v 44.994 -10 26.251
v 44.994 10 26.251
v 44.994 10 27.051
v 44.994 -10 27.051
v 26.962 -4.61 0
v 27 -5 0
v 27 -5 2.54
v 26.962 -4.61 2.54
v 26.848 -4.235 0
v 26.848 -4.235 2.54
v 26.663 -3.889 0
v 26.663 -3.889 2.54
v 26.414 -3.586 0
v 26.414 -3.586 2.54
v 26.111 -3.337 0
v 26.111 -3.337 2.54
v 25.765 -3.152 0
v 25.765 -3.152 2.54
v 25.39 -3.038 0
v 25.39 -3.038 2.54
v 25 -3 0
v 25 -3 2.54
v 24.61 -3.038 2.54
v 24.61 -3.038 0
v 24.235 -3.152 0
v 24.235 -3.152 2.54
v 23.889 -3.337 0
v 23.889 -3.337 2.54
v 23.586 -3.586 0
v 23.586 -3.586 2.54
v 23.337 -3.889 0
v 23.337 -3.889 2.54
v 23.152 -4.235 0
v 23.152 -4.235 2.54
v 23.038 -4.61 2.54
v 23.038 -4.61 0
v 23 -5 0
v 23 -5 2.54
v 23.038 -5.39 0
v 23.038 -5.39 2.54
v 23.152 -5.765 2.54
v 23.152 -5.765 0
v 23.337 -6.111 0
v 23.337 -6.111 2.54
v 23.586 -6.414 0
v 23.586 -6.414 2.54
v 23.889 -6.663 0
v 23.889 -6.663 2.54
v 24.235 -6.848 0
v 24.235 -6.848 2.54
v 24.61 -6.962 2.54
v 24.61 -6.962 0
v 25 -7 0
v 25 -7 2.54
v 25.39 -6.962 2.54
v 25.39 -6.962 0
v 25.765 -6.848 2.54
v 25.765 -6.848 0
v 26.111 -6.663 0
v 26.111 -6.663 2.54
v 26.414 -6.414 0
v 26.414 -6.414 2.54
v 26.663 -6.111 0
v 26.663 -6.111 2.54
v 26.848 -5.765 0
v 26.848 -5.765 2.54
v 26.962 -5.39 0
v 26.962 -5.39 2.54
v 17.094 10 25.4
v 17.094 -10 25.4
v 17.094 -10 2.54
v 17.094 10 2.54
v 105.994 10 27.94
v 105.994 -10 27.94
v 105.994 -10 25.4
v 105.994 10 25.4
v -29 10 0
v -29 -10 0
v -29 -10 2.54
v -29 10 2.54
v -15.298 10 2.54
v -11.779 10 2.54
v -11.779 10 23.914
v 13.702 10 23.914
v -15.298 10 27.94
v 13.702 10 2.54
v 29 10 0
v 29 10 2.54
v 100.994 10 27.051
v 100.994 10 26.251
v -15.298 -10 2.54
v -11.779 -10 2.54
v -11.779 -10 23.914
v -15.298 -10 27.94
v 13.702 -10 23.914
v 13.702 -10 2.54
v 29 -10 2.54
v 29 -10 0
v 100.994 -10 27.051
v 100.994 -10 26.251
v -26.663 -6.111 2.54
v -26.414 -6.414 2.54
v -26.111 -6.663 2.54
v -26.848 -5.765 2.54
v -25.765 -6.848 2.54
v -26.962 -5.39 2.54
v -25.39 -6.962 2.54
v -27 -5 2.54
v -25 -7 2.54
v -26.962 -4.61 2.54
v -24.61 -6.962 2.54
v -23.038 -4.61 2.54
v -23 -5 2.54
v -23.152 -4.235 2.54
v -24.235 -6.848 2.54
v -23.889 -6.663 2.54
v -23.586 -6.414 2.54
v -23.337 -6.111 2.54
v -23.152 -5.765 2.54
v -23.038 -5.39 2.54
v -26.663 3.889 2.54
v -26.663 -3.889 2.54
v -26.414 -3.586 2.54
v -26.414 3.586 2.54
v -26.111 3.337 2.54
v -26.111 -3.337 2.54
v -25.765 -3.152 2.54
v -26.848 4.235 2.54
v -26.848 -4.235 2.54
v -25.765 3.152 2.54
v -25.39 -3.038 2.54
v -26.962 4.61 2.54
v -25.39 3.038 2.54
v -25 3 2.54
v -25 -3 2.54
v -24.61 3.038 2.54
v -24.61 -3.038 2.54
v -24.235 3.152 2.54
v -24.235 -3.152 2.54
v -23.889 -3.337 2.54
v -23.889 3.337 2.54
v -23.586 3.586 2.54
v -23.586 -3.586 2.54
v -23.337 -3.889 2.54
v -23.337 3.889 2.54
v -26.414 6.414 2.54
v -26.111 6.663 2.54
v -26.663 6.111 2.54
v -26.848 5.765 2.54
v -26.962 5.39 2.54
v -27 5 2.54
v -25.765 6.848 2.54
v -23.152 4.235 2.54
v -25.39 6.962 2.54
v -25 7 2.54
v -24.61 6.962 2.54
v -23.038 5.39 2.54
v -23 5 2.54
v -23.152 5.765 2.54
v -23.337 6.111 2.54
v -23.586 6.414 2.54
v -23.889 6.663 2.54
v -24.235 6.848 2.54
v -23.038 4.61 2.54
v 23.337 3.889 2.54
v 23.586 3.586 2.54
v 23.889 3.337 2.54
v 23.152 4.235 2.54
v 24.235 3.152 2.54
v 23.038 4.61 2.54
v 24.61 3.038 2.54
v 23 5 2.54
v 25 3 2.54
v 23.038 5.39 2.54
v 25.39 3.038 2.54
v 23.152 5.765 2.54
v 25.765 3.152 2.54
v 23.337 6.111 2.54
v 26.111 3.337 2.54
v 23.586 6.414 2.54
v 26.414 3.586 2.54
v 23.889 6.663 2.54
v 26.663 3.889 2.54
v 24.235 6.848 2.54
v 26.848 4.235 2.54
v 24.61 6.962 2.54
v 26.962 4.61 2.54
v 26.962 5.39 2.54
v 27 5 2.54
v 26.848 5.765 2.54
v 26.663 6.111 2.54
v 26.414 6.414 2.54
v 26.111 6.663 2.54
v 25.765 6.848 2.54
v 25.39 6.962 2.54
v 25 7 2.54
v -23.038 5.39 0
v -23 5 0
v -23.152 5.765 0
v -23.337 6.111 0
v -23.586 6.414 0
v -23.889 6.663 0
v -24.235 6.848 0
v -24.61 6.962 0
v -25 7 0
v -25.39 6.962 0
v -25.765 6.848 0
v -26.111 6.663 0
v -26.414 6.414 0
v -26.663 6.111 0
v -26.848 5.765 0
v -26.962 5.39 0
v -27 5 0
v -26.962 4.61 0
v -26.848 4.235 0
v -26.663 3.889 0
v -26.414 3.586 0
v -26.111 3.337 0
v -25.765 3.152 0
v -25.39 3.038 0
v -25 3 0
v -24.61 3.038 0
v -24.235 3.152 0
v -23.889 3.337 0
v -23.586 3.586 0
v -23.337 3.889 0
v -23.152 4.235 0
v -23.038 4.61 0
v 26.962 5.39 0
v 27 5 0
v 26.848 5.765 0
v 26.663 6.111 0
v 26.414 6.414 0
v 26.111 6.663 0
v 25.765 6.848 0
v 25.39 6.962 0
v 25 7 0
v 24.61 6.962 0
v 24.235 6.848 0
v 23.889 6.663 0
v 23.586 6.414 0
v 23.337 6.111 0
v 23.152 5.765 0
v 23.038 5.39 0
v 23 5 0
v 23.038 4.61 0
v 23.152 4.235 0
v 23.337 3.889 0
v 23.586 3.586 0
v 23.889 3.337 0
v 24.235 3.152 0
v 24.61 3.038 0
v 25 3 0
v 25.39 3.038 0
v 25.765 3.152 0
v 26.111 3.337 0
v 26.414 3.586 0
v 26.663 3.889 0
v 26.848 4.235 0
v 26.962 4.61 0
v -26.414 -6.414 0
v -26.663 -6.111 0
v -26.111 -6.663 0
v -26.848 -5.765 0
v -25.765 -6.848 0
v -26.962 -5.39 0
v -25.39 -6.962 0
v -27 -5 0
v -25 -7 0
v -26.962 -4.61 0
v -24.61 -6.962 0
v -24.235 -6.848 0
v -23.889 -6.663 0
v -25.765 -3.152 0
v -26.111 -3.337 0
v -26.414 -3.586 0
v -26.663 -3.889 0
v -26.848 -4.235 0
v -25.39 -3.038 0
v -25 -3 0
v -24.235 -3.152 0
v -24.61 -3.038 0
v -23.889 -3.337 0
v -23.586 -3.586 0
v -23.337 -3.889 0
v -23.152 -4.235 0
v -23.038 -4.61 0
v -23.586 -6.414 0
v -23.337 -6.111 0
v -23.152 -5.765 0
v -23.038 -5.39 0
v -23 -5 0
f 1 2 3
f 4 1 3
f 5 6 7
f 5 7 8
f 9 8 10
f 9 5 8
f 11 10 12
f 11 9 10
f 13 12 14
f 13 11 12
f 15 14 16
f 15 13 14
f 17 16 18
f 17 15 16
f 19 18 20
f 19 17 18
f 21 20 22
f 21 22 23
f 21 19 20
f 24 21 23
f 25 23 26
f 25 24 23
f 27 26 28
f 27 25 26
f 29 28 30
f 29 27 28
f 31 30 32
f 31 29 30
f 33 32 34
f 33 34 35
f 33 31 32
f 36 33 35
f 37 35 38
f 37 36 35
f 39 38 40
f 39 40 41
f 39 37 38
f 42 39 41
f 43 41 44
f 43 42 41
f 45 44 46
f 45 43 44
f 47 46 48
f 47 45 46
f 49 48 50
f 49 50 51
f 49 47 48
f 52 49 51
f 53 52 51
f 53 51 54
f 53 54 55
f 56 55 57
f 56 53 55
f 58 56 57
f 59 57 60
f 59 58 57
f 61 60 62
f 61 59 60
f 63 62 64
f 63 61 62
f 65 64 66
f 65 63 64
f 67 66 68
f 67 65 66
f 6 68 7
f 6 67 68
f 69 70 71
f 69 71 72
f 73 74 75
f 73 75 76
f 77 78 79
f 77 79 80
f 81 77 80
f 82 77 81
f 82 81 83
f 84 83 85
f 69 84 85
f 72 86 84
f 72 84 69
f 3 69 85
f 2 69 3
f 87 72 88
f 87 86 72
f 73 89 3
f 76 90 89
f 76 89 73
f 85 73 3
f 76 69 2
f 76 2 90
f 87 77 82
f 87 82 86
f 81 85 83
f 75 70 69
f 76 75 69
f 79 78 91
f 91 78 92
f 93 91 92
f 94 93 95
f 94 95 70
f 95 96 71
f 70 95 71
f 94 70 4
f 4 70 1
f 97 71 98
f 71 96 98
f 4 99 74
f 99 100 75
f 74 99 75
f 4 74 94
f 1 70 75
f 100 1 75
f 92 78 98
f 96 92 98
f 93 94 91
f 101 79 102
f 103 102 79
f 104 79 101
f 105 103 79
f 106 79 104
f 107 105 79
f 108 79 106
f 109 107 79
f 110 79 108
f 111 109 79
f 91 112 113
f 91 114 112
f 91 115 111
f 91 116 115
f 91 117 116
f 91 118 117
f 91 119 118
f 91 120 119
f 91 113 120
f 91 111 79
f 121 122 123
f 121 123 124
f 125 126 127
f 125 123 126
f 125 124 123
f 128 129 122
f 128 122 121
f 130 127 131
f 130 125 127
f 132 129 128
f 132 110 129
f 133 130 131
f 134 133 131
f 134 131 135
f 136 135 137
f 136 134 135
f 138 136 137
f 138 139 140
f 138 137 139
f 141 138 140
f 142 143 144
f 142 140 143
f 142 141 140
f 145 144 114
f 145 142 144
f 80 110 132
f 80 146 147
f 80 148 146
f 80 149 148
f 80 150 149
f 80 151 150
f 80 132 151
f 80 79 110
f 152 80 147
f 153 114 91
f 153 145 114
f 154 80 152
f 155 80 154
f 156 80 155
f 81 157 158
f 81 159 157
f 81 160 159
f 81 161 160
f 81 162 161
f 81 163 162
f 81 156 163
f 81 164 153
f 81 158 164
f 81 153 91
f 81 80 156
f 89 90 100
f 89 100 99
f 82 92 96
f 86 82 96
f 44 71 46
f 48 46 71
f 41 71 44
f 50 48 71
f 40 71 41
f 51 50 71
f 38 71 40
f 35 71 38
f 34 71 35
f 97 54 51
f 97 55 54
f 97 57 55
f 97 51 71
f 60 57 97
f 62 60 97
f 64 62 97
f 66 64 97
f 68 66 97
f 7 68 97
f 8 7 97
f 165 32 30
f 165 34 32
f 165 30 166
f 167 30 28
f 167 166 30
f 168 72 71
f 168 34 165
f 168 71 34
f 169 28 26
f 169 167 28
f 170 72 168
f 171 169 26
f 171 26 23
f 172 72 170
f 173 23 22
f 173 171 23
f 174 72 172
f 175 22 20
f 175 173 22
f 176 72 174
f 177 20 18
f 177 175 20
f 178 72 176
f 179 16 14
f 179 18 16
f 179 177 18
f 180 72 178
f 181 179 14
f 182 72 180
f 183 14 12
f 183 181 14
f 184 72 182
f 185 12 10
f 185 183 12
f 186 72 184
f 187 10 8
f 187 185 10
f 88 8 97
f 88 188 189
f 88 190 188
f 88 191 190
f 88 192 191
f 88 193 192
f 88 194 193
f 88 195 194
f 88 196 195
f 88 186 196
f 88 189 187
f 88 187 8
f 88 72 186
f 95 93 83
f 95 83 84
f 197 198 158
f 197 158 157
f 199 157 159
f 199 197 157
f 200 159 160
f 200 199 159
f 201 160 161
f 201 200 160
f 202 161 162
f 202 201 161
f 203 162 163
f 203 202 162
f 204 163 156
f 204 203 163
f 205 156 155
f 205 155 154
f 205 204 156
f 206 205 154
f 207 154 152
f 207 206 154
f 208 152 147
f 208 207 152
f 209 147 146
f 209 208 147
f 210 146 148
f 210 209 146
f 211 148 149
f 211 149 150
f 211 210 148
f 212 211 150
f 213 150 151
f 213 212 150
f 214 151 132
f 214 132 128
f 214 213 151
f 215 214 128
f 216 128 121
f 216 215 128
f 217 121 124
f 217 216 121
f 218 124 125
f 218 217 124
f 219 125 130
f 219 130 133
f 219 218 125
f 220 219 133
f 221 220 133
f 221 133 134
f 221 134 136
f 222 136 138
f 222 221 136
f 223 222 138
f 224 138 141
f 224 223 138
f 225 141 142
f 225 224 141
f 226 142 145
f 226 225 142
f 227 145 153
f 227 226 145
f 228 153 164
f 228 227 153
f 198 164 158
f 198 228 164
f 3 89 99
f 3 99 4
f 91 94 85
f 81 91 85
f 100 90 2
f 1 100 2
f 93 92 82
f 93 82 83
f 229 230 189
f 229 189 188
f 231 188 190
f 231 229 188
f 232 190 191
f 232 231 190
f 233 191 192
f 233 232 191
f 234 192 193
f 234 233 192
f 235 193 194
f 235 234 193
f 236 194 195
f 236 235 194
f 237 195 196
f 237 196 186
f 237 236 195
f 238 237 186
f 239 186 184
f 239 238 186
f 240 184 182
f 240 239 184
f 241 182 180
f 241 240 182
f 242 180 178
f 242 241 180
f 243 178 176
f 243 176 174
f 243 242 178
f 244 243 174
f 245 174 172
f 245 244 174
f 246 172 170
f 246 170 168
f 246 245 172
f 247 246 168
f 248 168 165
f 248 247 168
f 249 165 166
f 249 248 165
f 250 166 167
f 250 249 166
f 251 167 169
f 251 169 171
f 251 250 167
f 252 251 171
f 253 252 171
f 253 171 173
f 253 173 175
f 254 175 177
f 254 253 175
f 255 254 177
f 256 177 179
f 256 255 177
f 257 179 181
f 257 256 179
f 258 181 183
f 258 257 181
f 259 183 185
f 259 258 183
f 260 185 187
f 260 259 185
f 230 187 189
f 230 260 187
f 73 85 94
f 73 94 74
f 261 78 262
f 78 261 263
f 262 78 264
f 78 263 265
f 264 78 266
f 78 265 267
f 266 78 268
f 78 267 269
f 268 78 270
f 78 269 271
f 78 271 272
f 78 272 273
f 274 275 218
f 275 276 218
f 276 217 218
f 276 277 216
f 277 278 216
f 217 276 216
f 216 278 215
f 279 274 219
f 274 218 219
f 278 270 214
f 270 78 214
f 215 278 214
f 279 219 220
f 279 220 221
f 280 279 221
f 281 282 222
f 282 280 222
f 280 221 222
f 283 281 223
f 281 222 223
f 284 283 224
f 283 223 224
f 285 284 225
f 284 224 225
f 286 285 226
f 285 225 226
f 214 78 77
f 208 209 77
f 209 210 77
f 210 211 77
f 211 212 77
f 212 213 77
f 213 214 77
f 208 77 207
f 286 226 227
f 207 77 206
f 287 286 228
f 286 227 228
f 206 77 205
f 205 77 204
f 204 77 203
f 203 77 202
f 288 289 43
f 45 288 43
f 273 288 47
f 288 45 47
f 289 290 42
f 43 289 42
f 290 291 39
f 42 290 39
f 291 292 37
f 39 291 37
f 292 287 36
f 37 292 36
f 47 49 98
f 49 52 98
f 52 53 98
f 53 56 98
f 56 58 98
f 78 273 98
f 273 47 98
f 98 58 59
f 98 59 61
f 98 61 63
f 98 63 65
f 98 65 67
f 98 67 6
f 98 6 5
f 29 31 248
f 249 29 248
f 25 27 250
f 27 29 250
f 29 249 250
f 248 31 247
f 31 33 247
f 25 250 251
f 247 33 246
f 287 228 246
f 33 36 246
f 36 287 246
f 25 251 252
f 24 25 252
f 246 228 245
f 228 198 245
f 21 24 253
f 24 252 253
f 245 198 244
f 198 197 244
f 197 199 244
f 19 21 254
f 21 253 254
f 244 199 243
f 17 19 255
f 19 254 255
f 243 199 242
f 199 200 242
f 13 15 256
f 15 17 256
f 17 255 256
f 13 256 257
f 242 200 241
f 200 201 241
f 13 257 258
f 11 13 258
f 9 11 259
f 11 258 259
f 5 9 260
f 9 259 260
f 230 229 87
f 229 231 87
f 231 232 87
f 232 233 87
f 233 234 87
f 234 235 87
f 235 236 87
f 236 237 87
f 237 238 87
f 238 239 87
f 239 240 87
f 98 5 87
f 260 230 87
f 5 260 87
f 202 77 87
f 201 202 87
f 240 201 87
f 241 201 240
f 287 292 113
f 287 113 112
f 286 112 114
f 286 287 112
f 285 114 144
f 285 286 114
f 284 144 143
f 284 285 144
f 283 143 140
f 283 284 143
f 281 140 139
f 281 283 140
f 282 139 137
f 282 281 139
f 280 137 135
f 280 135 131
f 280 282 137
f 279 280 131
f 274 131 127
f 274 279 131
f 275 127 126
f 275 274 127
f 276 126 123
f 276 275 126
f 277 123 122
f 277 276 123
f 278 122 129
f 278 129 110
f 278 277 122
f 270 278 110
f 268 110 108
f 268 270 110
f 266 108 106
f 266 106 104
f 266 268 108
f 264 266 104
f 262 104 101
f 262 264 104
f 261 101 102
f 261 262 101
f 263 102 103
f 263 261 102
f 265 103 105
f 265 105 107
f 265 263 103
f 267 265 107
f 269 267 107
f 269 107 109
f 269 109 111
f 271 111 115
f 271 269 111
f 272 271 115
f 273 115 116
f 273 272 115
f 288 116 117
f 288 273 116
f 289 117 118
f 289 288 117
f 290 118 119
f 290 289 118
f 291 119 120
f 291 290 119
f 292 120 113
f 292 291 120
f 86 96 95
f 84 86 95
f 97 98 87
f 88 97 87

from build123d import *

# Parameters (mm, degrees)
F0_W     = 58
F0_H     = 20
F0_R     = 2
F1_DEPTH = 2.54
F2_W     = 32.392131
F2_H     = 20
F3_DEPTH = 25.4
F4_W     = 20
F4_H     = 2.54
F5_DEPTH = 88.9
F6_W     = 56
F6_H     = 0.8
F7_DEPTH = 20.001
F8_W     = 25.481197
F8_H     = 21.373894
F9_DEPTH = 20.001


with BuildPart() as f1:
    # F0 (on Top) → F1 (new body)
    with BuildSketch(Plane.XY):
        Rectangle(F0_W, F0_H)
        with Locations((-25, -5)):
            Circle(F0_R, mode=Mode.SUBTRACT)
        with Locations((25, -5)):
            Circle(F0_R, mode=Mode.SUBTRACT)
        with Locations((-25, 5)):
            Circle(F0_R, mode=Mode.SUBTRACT)
        with Locations((25, 5)):
            Circle(F0_R, mode=Mode.SUBTRACT)
    extrude(amount=F1_DEPTH)

    # F2 (on face) → F3 (join)
    with BuildSketch(Plane.XY.offset(2.54)):
        with Locations((0.897951, 0)):
            Rectangle(F2_W, F2_H)
    extrude(amount=F3_DEPTH)

    # F4 (on face) → F5 (join)
    with BuildSketch(Plane.YZ.offset(17.094016)):
        with Locations((0, 26.67)):
            Rectangle(F4_W, F4_H)
    extrude(amount=F5_DEPTH)

    # F6 (on face) → F7 (cut, through all)
    with BuildSketch(Plane(origin=(0, 10, 0), x_dir=(-1, 0, 0), z_dir=(0, 1, 0))):
        with Locations((-72.994016, 26.651)):
            Rectangle(F6_W, F6_H)
    extrude(amount=-F7_DEPTH, mode=Mode.SUBTRACT)

    # F8 (on face) → F9 (cut, through all)
    with BuildSketch(Plane.XZ.offset(10)):
        with Locations((0.961546, 13.226947)):
            Rectangle(F8_W, F8_H)
    extrude(amount=-F9_DEPTH, mode=Mode.SUBTRACT)


solid = f1.part
